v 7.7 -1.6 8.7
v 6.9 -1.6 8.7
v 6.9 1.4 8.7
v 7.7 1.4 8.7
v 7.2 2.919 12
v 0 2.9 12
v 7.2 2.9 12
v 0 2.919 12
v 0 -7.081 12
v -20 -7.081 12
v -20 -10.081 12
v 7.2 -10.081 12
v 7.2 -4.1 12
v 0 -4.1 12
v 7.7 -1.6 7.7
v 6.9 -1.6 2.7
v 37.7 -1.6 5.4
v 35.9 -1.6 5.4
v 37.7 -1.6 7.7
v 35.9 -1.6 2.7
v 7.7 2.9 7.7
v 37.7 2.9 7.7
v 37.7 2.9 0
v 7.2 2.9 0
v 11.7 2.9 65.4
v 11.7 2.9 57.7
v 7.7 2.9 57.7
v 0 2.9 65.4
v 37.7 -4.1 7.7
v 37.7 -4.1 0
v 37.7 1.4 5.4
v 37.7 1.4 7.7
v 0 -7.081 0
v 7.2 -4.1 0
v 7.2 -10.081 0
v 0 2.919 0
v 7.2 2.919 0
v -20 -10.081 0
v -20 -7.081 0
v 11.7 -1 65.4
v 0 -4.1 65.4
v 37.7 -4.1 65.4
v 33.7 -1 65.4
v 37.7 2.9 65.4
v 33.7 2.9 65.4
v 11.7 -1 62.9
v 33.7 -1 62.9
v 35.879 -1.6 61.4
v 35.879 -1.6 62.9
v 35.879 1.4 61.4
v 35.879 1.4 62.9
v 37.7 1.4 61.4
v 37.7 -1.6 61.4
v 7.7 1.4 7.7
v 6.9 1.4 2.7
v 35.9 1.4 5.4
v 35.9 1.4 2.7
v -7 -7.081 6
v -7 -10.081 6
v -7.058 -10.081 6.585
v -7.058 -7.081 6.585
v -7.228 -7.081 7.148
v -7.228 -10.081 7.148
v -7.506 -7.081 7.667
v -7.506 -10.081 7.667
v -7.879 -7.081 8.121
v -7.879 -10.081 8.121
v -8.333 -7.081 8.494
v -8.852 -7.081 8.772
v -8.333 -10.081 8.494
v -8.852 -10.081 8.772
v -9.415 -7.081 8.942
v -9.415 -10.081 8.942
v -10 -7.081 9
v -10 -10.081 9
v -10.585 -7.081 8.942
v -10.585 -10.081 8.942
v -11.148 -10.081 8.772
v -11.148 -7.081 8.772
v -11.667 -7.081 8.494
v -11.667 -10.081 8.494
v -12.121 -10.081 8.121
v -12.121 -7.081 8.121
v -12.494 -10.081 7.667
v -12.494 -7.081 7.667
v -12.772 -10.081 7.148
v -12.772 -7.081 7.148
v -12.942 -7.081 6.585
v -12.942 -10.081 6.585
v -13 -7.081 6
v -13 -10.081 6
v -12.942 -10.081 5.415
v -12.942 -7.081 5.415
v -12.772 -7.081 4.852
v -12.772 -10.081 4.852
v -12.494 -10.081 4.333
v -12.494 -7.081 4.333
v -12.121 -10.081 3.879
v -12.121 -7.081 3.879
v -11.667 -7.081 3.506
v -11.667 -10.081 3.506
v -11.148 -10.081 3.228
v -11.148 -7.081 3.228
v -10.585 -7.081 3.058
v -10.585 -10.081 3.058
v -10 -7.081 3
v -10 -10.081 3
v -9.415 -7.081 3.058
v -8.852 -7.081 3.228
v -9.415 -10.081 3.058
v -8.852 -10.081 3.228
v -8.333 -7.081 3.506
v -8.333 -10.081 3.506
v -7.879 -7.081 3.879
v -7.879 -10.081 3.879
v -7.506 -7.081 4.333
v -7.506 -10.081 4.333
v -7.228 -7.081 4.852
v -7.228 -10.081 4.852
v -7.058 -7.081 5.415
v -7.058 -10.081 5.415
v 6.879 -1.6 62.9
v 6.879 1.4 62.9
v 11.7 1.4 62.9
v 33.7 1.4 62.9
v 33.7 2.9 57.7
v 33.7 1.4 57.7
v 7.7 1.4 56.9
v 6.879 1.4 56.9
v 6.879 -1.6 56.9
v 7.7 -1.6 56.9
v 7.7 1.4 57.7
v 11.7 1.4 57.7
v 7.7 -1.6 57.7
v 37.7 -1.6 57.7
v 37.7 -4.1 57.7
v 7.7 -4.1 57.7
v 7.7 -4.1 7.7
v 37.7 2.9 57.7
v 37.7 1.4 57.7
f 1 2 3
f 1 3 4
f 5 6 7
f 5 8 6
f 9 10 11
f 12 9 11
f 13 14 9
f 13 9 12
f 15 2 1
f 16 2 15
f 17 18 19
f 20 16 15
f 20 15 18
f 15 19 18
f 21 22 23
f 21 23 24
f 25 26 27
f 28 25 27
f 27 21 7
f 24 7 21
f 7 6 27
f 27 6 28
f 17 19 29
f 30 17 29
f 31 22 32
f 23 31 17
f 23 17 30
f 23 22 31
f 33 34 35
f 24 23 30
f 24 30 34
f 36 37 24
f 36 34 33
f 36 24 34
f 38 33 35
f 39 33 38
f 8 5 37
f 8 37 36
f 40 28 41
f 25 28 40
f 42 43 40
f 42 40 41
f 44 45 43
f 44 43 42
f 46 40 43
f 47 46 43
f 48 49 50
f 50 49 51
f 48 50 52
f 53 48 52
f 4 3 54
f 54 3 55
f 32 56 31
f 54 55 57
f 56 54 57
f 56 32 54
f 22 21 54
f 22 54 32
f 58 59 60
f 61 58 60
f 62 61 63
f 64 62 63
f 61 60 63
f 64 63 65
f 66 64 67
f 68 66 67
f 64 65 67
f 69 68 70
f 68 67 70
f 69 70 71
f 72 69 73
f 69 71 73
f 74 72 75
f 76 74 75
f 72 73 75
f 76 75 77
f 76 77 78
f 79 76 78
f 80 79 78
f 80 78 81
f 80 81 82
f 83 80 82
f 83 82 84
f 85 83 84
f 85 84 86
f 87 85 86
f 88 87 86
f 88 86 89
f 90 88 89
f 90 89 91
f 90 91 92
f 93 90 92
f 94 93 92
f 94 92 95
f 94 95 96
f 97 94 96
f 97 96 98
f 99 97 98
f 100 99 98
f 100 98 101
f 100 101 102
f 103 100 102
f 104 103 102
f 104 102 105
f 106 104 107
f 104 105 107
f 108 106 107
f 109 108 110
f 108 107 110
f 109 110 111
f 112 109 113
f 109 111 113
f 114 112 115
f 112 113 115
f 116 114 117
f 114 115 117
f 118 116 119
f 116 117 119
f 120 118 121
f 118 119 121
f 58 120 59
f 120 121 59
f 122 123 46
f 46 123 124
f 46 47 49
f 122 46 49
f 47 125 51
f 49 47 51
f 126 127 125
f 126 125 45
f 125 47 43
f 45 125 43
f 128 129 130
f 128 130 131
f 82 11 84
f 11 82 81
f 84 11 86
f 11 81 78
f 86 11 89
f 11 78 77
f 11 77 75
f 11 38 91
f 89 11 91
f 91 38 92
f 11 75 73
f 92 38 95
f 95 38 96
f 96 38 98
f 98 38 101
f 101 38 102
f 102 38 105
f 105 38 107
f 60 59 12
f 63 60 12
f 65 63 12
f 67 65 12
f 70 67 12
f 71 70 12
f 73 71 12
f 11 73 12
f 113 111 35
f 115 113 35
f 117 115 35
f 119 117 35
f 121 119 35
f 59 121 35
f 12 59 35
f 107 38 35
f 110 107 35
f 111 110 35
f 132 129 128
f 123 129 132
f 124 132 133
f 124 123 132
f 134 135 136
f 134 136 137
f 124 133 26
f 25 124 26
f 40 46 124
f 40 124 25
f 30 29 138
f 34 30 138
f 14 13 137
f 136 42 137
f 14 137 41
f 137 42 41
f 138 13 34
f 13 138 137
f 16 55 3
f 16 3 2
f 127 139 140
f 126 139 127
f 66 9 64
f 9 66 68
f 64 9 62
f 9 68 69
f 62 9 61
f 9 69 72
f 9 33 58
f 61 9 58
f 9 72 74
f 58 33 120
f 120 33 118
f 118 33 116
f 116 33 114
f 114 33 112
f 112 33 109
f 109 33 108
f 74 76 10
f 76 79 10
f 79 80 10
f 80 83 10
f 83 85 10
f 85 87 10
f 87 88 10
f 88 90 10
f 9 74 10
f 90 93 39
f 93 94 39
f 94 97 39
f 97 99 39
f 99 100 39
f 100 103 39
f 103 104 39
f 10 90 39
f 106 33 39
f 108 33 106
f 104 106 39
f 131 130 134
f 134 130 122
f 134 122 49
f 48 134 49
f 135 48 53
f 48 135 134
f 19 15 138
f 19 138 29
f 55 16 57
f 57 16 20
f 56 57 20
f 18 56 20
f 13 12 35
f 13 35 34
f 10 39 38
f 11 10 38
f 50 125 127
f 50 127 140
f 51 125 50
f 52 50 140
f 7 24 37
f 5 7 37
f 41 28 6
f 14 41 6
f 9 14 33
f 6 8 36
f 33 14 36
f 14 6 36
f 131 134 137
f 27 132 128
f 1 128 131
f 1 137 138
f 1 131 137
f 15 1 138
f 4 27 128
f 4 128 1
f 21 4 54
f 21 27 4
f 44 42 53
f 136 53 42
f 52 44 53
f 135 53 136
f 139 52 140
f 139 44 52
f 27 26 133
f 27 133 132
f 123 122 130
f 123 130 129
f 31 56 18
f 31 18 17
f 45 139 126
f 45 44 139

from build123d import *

# Parameters (mm, degrees)
PAD_DEPTH       = 12
SKETCH001_R     = 3
HOLE_DEPTH      = 13.001
PAD001_DEPTH    = 7
SKETCH003_W     = 29
SKETCH003_H     = 3
POCKET_DEPTH    = 6
SKETCH004_W     = 29
SKETCH004_H     = 3
POCKET001_DEPTH = 6
SKETCH005_W     = 22
SKETCH005_H     = 10.958168
POCKET002_DEPTH = 6
SKETCH006_W     = 1.8213907522
SKETCH006_H     = 3
POCKET003_DEPTH = 5
SKETCH007_W     = 1.8213907522
SKETCH007_H     = 3
POCKET004_DEPTH = 5


with BuildPart() as part:
    # Sketch → Pad (new body)
    with BuildSketch(Plane.XY):
        Polygon((-20, -10.0810480488), (7.2, -10.0810480488), (7.2, 2.9189519512), (0, 2.9189519512), (0, -7.0810480488), (-20, -7.0810480488), align=None)
    extrude(amount=PAD_DEPTH)

    # Sketch001 (on Face1 of Pad) → Hole (cut, through all)
    with BuildSketch(Plane.XZ.offset(10.0810480488)):
        with Locations((-10, 6)):
            Circle(SKETCH001_R)
    extrude(amount=-HOLE_DEPTH, mode=Mode.SUBTRACT)

    # Sketch002 → Pad001 (join)
    with BuildSketch(Plane.XZ.offset(-2.9)):
        Polygon((37.7, 7.7), (37.7, 0), (0, 0), (0, 11.991246), (0, 65.4), (37.7, 65.4), (37.7, 57.7), (7.7, 57.7), (7.7, 7.7), align=None)
    extrude(amount=PAD001_DEPTH)

    # Sketch003 (on Face15 of Pad001) → Pocket (cut)
    with BuildSketch(Plane(origin=(0, 6, 2.7), x_dir=(1, 0, 0), z_dir=(0, 0, -1))):
        with Locations((21.3996930994, 6.1)):
            Rectangle(SKETCH003_W, SKETCH003_H)
    extrude(amount=-POCKET_DEPTH, mode=Mode.SUBTRACT)

    # Sketch004 (on Face17 of Pocket) → Pocket001 (cut)
    with BuildSketch(Plane(origin=(54, -65, 62.9), x_dir=(1, 0, 0), z_dir=(0, 0, 1))):
        with Locations((-32.6213907522, 64.9)):
            Rectangle(SKETCH004_W, SKETCH004_H)
    extrude(amount=-POCKET001_DEPTH, mode=Mode.SUBTRACT)

    # Sketch005 → Pocket002 (cut)
    with BuildSketch(Plane.XZ.offset(1)):
        with Locations((22.7, 62.096554)):
            Rectangle(SKETCH005_W, SKETCH005_H)
    extrude(amount=-POCKET002_DEPTH, mode=Mode.SUBTRACT)

    # Sketch006 → Pocket003 (cut)
    with BuildSketch(Plane.XY.offset(5.4)):
        with Locations((36.7893046239, -0.1)):
            Rectangle(SKETCH006_W, SKETCH006_H)
    extrude(amount=POCKET003_DEPTH, mode=Mode.SUBTRACT)

    # Sketch007 → Pocket004 (cut)
    with BuildSketch(Plane.XY.offset(61.4)):
        with Locations((36.7893046239, -0.1)):
            Rectangle(SKETCH007_W, SKETCH007_H)
    extrude(amount=-POCKET004_DEPTH, mode=Mode.SUBTRACT)


solid = part.part
